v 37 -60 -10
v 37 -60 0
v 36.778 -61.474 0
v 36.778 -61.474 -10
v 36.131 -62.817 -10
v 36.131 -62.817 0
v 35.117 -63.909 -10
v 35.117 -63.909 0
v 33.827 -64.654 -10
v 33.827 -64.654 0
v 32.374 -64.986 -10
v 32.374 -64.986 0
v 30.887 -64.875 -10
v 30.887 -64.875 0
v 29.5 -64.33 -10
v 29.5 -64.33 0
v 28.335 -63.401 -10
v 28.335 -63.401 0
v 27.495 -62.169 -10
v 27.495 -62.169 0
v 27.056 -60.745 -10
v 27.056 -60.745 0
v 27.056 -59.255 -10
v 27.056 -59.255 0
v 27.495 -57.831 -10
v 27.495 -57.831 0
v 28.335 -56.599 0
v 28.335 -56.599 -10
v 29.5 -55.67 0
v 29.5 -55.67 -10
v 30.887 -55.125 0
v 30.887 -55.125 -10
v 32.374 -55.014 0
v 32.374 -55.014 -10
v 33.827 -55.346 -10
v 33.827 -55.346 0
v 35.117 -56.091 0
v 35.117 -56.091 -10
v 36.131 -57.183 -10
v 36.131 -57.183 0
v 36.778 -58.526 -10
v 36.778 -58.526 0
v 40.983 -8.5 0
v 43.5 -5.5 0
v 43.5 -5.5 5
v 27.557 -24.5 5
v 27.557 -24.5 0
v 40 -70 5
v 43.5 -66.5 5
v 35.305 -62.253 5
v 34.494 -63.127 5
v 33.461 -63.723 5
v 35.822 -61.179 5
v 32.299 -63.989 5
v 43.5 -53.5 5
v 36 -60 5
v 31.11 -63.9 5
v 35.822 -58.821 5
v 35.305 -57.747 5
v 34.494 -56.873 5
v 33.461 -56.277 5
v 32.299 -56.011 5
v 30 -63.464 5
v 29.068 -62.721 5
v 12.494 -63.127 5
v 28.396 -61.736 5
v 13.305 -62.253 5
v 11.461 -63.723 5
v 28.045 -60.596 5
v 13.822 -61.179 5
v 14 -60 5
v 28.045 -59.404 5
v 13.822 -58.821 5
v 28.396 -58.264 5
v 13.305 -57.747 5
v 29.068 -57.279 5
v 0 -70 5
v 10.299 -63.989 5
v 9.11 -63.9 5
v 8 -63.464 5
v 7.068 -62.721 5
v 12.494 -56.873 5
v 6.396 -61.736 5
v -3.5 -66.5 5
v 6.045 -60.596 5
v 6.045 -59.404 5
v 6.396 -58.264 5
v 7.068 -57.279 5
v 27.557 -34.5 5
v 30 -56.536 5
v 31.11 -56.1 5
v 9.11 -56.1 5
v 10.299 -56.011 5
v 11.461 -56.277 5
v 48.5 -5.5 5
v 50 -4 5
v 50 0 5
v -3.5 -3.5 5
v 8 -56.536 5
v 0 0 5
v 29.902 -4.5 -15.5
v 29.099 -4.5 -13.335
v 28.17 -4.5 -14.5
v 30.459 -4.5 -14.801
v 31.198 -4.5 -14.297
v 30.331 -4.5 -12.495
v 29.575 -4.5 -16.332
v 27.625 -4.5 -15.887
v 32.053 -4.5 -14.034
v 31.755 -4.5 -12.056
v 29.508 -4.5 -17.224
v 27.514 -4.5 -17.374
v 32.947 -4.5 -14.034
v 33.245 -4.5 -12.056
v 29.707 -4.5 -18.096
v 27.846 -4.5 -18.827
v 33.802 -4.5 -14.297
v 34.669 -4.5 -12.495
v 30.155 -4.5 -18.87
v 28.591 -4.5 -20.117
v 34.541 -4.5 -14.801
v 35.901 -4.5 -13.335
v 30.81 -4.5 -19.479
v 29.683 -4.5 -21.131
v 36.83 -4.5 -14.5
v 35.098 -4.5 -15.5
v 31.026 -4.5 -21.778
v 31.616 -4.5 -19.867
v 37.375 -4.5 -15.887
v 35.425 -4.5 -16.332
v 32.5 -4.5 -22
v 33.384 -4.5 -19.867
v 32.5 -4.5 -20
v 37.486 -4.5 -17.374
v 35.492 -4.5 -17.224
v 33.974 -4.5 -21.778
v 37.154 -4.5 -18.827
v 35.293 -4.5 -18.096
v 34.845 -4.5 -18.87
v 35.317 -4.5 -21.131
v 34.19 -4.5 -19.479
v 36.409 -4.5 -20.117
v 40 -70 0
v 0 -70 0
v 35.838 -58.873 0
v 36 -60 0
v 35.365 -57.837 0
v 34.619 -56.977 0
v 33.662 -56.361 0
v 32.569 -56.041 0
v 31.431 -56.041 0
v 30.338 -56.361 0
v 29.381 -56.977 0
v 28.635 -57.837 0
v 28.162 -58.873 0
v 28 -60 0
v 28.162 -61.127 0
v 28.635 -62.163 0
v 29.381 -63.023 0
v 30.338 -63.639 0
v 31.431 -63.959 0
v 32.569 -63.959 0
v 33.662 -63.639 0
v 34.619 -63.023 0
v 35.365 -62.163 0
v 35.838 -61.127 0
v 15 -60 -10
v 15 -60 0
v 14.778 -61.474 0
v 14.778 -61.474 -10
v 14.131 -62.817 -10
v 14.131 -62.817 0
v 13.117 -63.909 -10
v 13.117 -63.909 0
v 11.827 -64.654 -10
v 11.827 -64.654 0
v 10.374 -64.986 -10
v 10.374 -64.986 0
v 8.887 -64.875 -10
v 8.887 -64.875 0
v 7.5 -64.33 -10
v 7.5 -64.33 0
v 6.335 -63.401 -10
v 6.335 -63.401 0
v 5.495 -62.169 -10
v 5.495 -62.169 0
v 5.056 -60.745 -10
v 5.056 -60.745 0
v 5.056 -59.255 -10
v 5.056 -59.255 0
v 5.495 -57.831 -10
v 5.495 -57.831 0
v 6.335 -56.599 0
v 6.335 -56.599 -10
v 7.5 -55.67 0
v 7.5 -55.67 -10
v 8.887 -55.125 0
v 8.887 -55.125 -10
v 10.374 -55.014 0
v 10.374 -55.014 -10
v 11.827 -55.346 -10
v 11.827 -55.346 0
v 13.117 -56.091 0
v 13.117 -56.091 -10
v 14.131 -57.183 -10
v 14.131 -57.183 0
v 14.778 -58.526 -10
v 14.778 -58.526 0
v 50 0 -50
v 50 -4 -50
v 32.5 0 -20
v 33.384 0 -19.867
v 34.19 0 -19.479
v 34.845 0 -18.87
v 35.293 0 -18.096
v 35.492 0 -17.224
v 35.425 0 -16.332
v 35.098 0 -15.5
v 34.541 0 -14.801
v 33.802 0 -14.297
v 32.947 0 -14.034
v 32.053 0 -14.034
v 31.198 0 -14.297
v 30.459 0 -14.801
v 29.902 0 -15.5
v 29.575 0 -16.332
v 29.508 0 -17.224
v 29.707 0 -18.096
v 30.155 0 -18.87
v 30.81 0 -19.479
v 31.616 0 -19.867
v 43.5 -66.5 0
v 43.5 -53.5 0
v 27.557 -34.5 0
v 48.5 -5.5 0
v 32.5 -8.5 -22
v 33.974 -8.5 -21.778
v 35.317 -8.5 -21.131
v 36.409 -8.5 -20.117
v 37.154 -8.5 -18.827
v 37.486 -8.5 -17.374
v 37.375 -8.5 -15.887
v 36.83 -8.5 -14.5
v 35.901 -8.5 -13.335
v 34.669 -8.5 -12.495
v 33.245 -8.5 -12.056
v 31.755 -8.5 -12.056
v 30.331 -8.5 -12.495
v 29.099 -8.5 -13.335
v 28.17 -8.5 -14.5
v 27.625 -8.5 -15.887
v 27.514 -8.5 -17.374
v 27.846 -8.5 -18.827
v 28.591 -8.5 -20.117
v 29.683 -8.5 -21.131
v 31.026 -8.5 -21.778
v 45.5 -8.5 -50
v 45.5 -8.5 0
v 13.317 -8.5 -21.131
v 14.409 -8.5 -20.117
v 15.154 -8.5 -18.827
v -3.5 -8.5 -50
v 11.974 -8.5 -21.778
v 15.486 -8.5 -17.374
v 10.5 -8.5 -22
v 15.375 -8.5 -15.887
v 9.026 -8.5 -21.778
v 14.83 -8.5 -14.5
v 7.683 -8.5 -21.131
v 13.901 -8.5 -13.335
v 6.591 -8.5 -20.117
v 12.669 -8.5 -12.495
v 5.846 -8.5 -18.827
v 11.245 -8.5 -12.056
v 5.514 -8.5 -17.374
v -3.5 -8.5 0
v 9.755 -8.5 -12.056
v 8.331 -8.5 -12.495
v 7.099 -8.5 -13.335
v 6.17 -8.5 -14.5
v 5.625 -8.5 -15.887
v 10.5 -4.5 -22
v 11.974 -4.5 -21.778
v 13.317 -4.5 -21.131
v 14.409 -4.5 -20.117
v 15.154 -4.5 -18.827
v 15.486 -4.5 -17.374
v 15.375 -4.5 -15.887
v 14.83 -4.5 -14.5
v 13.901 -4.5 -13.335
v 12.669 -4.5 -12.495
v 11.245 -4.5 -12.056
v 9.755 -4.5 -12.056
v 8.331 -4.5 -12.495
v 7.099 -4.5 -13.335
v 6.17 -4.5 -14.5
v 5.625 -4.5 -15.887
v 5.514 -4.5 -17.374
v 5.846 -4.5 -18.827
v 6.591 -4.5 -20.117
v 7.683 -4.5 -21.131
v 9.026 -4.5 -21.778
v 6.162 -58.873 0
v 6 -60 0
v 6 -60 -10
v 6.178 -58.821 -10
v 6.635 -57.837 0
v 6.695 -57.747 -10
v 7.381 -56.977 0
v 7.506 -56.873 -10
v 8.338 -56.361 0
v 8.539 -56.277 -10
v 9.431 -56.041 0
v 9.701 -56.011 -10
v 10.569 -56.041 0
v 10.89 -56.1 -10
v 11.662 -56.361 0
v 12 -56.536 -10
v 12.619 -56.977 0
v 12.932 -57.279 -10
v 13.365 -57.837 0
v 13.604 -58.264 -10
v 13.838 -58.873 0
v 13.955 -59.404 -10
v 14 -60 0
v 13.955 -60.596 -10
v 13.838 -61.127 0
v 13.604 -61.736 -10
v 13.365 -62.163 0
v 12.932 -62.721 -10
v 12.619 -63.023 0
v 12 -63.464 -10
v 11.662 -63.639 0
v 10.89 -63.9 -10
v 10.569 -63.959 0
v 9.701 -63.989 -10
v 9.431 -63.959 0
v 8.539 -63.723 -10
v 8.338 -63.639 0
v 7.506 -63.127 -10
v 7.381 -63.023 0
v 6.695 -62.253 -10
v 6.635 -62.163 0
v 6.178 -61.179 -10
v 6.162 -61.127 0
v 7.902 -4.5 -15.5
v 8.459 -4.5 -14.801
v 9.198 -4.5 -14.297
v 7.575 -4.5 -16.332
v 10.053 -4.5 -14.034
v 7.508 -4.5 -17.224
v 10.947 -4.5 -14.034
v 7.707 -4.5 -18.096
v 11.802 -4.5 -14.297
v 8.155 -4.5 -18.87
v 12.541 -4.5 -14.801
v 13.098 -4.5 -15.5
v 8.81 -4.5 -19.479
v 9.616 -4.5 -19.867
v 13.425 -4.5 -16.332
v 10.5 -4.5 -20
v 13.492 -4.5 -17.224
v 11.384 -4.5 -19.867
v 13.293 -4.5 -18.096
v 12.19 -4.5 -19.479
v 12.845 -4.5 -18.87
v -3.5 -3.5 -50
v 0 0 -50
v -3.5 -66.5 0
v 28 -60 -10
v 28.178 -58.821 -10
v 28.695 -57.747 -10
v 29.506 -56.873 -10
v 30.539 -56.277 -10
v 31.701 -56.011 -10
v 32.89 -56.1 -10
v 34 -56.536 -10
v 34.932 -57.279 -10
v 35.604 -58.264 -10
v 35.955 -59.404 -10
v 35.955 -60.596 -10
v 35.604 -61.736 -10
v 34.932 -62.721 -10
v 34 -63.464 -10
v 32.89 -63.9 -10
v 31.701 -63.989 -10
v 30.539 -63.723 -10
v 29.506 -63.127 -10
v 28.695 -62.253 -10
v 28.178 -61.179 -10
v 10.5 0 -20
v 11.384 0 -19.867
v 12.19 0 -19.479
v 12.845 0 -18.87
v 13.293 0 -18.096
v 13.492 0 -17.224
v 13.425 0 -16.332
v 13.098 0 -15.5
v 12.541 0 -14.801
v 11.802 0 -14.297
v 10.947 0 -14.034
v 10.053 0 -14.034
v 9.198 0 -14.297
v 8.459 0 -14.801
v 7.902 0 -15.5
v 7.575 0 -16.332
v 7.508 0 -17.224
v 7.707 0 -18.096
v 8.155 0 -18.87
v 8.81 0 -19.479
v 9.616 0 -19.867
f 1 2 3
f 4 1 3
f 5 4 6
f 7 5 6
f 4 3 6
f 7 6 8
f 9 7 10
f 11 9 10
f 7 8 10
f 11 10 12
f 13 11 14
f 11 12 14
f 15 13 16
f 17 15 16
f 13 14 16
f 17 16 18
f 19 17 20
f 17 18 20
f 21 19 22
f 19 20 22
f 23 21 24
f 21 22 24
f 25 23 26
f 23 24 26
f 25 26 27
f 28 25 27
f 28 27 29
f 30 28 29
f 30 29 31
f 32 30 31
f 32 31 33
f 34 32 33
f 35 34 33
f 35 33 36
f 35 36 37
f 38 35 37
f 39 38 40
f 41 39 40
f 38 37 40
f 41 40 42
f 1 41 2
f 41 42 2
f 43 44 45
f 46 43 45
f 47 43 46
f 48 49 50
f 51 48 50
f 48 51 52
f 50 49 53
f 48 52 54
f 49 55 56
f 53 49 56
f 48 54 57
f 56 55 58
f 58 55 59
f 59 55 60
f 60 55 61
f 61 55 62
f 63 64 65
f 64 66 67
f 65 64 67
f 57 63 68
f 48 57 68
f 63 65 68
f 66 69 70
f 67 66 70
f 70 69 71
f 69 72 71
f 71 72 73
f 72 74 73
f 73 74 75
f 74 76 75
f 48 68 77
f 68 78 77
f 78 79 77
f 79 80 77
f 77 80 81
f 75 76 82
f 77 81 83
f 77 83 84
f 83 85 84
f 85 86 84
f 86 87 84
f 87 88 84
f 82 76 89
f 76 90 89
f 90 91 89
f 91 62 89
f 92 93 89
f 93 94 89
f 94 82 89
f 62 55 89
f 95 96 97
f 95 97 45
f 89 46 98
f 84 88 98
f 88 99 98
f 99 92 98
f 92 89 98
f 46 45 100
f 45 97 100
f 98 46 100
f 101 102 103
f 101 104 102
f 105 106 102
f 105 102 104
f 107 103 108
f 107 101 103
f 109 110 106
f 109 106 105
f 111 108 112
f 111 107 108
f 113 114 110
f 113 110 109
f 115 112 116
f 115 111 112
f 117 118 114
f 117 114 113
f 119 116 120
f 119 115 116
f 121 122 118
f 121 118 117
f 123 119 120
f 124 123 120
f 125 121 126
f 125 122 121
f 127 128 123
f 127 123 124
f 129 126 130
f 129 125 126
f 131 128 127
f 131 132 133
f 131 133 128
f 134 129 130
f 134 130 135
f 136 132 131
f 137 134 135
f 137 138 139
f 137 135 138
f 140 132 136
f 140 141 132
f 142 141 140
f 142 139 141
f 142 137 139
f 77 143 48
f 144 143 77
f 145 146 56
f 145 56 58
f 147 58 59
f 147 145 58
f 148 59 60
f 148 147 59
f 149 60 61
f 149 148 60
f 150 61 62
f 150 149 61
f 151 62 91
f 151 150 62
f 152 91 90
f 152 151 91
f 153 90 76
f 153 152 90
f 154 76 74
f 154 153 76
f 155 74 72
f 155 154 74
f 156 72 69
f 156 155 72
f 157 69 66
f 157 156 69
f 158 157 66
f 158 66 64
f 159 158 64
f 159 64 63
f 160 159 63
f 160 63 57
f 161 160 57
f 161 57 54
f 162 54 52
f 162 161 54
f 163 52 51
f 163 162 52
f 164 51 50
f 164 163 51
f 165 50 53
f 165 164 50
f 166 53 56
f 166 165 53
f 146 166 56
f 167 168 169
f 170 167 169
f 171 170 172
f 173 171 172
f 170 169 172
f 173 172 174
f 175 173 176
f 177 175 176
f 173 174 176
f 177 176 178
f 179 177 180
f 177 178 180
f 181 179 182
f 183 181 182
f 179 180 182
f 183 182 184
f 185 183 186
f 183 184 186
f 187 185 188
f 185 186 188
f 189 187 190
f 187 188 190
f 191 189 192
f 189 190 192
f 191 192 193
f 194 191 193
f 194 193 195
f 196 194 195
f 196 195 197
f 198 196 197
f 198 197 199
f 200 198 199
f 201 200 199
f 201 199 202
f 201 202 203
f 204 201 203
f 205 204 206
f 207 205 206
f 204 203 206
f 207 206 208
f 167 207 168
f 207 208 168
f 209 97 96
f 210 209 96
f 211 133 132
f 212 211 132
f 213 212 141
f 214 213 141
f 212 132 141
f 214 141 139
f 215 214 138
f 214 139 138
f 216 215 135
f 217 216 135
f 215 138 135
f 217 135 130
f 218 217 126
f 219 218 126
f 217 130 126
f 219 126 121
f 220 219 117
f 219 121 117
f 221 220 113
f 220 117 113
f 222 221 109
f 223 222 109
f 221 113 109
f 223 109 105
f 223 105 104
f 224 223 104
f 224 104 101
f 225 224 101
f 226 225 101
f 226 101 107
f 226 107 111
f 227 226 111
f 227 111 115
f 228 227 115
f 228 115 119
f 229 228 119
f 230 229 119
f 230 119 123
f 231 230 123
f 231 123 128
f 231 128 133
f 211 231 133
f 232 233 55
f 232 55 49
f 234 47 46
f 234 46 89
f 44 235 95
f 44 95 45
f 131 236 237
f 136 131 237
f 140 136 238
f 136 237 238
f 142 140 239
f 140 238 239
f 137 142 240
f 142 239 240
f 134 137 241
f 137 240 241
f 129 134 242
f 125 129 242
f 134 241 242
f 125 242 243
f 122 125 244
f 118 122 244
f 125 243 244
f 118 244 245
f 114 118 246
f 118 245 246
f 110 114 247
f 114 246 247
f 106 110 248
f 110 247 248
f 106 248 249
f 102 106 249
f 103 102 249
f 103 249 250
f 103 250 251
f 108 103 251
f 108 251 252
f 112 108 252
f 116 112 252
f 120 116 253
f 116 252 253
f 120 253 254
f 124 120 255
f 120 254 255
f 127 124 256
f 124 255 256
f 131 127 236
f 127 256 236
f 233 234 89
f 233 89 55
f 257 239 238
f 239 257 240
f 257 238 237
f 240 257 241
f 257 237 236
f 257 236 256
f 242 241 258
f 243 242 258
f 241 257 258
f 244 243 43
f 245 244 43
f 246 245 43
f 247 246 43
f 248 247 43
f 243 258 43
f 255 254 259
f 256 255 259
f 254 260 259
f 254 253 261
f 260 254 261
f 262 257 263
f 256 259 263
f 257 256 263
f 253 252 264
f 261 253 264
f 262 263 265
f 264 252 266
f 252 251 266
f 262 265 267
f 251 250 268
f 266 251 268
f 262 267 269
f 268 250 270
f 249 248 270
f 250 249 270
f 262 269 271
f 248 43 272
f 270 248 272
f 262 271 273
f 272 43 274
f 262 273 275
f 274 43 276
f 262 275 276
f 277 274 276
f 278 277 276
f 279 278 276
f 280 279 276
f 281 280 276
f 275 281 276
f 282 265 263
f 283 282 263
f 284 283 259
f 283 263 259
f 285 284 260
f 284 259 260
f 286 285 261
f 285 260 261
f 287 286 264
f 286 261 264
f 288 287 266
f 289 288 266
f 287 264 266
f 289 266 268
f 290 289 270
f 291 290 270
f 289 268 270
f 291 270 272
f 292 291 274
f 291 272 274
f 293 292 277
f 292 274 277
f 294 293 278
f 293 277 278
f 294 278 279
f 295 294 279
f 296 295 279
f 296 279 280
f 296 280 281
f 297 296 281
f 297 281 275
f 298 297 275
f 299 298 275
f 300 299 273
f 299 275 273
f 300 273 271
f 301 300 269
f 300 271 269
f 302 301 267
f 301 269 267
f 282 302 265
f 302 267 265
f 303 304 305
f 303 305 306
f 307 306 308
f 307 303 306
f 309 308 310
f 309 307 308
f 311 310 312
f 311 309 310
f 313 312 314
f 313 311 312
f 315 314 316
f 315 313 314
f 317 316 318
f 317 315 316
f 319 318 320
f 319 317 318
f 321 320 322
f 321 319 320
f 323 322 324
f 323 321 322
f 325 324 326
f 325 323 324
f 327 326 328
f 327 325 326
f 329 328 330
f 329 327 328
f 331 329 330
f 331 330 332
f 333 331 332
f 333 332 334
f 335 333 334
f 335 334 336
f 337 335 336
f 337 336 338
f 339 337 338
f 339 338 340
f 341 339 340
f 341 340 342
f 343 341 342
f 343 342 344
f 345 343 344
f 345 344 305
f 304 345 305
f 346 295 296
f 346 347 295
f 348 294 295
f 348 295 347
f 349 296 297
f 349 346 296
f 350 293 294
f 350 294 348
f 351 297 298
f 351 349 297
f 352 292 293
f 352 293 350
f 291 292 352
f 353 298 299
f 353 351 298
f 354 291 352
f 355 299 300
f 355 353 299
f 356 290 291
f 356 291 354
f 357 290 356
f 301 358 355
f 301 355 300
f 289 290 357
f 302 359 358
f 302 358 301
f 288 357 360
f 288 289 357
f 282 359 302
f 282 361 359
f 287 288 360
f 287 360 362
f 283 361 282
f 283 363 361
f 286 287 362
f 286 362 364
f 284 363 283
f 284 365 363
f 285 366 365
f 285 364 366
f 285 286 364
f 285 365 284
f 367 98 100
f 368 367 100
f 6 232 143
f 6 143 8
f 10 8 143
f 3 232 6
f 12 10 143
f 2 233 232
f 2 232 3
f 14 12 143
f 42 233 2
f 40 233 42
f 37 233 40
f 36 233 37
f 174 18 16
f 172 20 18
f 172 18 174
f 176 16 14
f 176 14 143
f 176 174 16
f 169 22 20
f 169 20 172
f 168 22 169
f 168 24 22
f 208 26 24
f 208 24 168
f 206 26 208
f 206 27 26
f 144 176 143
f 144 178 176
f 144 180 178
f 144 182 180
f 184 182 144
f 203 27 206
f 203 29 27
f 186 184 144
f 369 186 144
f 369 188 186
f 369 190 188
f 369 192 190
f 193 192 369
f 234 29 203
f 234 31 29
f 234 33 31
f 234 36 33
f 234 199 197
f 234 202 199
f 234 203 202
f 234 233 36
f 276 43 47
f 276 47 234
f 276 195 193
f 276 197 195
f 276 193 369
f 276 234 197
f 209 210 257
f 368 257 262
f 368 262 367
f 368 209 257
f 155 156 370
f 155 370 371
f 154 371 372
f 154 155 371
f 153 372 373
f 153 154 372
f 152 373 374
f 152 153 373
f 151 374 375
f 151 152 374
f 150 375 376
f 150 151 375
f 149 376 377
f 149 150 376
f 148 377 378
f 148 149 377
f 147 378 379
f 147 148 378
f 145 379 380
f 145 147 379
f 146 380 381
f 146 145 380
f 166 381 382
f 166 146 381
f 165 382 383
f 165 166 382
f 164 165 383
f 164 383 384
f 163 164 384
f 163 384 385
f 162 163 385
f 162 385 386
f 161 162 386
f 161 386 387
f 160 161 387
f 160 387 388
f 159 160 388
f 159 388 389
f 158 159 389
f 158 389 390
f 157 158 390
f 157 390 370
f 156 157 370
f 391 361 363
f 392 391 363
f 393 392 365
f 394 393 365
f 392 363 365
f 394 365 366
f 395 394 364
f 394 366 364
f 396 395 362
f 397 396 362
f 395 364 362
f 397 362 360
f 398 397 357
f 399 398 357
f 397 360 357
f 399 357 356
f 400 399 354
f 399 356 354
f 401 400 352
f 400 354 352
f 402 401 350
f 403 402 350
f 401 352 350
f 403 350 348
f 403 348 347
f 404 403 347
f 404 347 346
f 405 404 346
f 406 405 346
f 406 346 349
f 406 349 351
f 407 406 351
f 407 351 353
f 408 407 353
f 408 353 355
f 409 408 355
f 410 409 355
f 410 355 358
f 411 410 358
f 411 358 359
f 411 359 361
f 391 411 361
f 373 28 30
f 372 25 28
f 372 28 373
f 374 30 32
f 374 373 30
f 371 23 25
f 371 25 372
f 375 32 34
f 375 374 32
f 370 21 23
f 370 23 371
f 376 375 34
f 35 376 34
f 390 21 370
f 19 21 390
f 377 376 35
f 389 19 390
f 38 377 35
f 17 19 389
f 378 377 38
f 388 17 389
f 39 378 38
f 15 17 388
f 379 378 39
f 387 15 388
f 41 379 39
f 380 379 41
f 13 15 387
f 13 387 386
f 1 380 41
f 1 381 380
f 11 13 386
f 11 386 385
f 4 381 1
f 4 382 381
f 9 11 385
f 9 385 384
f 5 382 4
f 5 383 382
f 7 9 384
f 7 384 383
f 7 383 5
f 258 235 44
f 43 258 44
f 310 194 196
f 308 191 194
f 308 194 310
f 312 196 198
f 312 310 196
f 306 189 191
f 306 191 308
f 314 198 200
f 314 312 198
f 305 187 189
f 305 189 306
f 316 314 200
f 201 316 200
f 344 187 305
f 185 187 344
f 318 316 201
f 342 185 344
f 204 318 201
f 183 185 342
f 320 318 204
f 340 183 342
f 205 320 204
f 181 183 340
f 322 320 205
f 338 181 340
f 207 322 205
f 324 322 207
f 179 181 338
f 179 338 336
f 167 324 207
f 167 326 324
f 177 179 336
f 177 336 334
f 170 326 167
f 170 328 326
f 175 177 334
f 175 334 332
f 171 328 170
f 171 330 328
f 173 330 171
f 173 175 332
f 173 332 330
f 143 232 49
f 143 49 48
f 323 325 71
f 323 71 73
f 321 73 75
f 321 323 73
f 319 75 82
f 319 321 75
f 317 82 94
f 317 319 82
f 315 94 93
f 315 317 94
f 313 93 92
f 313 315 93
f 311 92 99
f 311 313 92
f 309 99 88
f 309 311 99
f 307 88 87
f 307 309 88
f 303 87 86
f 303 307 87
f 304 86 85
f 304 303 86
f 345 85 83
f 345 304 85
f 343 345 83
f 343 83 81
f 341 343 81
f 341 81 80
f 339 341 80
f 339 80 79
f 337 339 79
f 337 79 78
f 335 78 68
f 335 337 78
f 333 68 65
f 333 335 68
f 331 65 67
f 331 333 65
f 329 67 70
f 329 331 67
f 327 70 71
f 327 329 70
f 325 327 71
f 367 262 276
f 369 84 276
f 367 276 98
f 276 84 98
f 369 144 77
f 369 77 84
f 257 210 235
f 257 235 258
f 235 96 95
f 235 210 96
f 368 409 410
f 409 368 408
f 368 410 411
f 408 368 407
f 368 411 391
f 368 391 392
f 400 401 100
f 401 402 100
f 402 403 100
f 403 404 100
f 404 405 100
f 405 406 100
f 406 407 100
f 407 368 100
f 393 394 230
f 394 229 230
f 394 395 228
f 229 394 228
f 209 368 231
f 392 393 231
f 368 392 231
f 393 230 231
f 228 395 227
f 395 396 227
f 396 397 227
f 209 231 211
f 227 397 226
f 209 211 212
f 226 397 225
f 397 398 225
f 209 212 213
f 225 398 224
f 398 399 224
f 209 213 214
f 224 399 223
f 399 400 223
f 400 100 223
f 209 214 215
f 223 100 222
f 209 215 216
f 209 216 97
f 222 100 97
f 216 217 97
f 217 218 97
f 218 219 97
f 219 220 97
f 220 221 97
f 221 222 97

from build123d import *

# Parameters (mm, degrees)
BOSS_EXTRUDE1_DEPTH     = 5
BOSS_EXTRUDE2_DEPTH     = 50
SKETCH5_R               = 3
CUT_EXTRUDE1_DEPTH      = 94.713659623
SKETCH6_R               = 5
SKETCH6_R_2             = 4
BOSS_EXTRUDE3_DEPTH     = 10
SKETCH5_3_R             = 5
SKETCH5_3_R_2           = 3
CUT_EXTRUDE2_DEPTH      = 4
ESQUISSE1_R             = 4
ENL_V_MAT_EXTRU_1_DEPTH = 100.498743711


with BuildPart() as part:
    # Sketch1 → Boss-Extrude1 (new body)
    with BuildSketch(Plane.XY):
        Polygon((40, -70), (43.5, -66.5), (43.5, -53.5), (27.557107008, -34.5), (27.557107008, -24.5), (43.5, -5.5), (48.5, -5.5), (50, -4), (50, 0), (0, 0), (-3.5, -3.5), (-3.5, -66.5), (0, -70), align=None)
    extrude(amount=BOSS_EXTRUDE1_DEPTH)

    # Sketch4 → Boss-Extrude2 (add)
    with BuildSketch(Plane(origin=(0, 0, 0), x_dir=(-1, 0, 0), z_dir=(0, 0, -1))):
        Polygon((-50, 0), (-50, -4), (-45.5, -8.5), (3.5, -8.5), (3.5, -3.5), (0, 0), align=None)
    extrude(amount=BOSS_EXTRUDE2_DEPTH)

    # Sketch5 → Cut-Extrude1 (cut, through all)
    with BuildSketch(Plane.XZ.offset(8.5)):
        with Locations((32.5, -17)):
            Circle(SKETCH5_R)
        with Locations((10.5, -17)):
            Circle(SKETCH5_R)
    extrude(amount=-CUT_EXTRUDE1_DEPTH, mode=Mode.SUBTRACT)

    # Sketch6 → Boss-Extrude3 (add)
    # profile 1 of 2: a face of its own
    with BuildSketch(Plane(origin=(0, 0, 0), x_dir=(-1, 0, 0), z_dir=(0, 0, -1))):
        with Locations((-10, -60)):
            Circle(SKETCH6_R)
        with Locations((-10, -60)):
            Circle(SKETCH6_R_2, mode=Mode.SUBTRACT)
    # profile 2 of 2: a face of its own
    with BuildSketch(Plane(origin=(0, 0, 0), x_dir=(-1, 0, 0), z_dir=(0, 0, -1))):
        with Locations((-32, -60)):
            Circle(SKETCH6_R)
        with Locations((-32, -60)):
            Circle(SKETCH6_R_2, mode=Mode.SUBTRACT)
    extrude(amount=BOSS_EXTRUDE3_DEPTH)

    # Sketch5<3> → Cut-Extrude2 (cut)
    # profile 1 of 2: a face of its own
    with BuildSketch(Plane.XZ.offset(8.5)):
        with Locations((10.5, -17)):
            Circle(SKETCH5_3_R)
        with Locations((10.5, -17)):
            Circle(SKETCH5_3_R_2, mode=Mode.SUBTRACT)
    # profile 2 of 2: a face of its own
    with BuildSketch(Plane.XZ.offset(8.5)):
        with Locations((32.5, -17)):
            Circle(SKETCH5_3_R)
        with Locations((32.5, -17)):
            Circle(SKETCH5_3_R_2, mode=Mode.SUBTRACT)
    extrude(amount=-CUT_EXTRUDE2_DEPTH, mode=Mode.SUBTRACT)

    # Esquisse1 → Enlèv. mat.-Extru.1 (cut, through all)
    with BuildSketch(Plane.XY):
        with Locations((10, -60)):
            Circle(ESQUISSE1_R)
        with Locations((32, -60)):
            Circle(ESQUISSE1_R)
    extrude(amount=ENL_V_MAT_EXTRU_1_DEPTH, mode=Mode.SUBTRACT)


solid = part.part
